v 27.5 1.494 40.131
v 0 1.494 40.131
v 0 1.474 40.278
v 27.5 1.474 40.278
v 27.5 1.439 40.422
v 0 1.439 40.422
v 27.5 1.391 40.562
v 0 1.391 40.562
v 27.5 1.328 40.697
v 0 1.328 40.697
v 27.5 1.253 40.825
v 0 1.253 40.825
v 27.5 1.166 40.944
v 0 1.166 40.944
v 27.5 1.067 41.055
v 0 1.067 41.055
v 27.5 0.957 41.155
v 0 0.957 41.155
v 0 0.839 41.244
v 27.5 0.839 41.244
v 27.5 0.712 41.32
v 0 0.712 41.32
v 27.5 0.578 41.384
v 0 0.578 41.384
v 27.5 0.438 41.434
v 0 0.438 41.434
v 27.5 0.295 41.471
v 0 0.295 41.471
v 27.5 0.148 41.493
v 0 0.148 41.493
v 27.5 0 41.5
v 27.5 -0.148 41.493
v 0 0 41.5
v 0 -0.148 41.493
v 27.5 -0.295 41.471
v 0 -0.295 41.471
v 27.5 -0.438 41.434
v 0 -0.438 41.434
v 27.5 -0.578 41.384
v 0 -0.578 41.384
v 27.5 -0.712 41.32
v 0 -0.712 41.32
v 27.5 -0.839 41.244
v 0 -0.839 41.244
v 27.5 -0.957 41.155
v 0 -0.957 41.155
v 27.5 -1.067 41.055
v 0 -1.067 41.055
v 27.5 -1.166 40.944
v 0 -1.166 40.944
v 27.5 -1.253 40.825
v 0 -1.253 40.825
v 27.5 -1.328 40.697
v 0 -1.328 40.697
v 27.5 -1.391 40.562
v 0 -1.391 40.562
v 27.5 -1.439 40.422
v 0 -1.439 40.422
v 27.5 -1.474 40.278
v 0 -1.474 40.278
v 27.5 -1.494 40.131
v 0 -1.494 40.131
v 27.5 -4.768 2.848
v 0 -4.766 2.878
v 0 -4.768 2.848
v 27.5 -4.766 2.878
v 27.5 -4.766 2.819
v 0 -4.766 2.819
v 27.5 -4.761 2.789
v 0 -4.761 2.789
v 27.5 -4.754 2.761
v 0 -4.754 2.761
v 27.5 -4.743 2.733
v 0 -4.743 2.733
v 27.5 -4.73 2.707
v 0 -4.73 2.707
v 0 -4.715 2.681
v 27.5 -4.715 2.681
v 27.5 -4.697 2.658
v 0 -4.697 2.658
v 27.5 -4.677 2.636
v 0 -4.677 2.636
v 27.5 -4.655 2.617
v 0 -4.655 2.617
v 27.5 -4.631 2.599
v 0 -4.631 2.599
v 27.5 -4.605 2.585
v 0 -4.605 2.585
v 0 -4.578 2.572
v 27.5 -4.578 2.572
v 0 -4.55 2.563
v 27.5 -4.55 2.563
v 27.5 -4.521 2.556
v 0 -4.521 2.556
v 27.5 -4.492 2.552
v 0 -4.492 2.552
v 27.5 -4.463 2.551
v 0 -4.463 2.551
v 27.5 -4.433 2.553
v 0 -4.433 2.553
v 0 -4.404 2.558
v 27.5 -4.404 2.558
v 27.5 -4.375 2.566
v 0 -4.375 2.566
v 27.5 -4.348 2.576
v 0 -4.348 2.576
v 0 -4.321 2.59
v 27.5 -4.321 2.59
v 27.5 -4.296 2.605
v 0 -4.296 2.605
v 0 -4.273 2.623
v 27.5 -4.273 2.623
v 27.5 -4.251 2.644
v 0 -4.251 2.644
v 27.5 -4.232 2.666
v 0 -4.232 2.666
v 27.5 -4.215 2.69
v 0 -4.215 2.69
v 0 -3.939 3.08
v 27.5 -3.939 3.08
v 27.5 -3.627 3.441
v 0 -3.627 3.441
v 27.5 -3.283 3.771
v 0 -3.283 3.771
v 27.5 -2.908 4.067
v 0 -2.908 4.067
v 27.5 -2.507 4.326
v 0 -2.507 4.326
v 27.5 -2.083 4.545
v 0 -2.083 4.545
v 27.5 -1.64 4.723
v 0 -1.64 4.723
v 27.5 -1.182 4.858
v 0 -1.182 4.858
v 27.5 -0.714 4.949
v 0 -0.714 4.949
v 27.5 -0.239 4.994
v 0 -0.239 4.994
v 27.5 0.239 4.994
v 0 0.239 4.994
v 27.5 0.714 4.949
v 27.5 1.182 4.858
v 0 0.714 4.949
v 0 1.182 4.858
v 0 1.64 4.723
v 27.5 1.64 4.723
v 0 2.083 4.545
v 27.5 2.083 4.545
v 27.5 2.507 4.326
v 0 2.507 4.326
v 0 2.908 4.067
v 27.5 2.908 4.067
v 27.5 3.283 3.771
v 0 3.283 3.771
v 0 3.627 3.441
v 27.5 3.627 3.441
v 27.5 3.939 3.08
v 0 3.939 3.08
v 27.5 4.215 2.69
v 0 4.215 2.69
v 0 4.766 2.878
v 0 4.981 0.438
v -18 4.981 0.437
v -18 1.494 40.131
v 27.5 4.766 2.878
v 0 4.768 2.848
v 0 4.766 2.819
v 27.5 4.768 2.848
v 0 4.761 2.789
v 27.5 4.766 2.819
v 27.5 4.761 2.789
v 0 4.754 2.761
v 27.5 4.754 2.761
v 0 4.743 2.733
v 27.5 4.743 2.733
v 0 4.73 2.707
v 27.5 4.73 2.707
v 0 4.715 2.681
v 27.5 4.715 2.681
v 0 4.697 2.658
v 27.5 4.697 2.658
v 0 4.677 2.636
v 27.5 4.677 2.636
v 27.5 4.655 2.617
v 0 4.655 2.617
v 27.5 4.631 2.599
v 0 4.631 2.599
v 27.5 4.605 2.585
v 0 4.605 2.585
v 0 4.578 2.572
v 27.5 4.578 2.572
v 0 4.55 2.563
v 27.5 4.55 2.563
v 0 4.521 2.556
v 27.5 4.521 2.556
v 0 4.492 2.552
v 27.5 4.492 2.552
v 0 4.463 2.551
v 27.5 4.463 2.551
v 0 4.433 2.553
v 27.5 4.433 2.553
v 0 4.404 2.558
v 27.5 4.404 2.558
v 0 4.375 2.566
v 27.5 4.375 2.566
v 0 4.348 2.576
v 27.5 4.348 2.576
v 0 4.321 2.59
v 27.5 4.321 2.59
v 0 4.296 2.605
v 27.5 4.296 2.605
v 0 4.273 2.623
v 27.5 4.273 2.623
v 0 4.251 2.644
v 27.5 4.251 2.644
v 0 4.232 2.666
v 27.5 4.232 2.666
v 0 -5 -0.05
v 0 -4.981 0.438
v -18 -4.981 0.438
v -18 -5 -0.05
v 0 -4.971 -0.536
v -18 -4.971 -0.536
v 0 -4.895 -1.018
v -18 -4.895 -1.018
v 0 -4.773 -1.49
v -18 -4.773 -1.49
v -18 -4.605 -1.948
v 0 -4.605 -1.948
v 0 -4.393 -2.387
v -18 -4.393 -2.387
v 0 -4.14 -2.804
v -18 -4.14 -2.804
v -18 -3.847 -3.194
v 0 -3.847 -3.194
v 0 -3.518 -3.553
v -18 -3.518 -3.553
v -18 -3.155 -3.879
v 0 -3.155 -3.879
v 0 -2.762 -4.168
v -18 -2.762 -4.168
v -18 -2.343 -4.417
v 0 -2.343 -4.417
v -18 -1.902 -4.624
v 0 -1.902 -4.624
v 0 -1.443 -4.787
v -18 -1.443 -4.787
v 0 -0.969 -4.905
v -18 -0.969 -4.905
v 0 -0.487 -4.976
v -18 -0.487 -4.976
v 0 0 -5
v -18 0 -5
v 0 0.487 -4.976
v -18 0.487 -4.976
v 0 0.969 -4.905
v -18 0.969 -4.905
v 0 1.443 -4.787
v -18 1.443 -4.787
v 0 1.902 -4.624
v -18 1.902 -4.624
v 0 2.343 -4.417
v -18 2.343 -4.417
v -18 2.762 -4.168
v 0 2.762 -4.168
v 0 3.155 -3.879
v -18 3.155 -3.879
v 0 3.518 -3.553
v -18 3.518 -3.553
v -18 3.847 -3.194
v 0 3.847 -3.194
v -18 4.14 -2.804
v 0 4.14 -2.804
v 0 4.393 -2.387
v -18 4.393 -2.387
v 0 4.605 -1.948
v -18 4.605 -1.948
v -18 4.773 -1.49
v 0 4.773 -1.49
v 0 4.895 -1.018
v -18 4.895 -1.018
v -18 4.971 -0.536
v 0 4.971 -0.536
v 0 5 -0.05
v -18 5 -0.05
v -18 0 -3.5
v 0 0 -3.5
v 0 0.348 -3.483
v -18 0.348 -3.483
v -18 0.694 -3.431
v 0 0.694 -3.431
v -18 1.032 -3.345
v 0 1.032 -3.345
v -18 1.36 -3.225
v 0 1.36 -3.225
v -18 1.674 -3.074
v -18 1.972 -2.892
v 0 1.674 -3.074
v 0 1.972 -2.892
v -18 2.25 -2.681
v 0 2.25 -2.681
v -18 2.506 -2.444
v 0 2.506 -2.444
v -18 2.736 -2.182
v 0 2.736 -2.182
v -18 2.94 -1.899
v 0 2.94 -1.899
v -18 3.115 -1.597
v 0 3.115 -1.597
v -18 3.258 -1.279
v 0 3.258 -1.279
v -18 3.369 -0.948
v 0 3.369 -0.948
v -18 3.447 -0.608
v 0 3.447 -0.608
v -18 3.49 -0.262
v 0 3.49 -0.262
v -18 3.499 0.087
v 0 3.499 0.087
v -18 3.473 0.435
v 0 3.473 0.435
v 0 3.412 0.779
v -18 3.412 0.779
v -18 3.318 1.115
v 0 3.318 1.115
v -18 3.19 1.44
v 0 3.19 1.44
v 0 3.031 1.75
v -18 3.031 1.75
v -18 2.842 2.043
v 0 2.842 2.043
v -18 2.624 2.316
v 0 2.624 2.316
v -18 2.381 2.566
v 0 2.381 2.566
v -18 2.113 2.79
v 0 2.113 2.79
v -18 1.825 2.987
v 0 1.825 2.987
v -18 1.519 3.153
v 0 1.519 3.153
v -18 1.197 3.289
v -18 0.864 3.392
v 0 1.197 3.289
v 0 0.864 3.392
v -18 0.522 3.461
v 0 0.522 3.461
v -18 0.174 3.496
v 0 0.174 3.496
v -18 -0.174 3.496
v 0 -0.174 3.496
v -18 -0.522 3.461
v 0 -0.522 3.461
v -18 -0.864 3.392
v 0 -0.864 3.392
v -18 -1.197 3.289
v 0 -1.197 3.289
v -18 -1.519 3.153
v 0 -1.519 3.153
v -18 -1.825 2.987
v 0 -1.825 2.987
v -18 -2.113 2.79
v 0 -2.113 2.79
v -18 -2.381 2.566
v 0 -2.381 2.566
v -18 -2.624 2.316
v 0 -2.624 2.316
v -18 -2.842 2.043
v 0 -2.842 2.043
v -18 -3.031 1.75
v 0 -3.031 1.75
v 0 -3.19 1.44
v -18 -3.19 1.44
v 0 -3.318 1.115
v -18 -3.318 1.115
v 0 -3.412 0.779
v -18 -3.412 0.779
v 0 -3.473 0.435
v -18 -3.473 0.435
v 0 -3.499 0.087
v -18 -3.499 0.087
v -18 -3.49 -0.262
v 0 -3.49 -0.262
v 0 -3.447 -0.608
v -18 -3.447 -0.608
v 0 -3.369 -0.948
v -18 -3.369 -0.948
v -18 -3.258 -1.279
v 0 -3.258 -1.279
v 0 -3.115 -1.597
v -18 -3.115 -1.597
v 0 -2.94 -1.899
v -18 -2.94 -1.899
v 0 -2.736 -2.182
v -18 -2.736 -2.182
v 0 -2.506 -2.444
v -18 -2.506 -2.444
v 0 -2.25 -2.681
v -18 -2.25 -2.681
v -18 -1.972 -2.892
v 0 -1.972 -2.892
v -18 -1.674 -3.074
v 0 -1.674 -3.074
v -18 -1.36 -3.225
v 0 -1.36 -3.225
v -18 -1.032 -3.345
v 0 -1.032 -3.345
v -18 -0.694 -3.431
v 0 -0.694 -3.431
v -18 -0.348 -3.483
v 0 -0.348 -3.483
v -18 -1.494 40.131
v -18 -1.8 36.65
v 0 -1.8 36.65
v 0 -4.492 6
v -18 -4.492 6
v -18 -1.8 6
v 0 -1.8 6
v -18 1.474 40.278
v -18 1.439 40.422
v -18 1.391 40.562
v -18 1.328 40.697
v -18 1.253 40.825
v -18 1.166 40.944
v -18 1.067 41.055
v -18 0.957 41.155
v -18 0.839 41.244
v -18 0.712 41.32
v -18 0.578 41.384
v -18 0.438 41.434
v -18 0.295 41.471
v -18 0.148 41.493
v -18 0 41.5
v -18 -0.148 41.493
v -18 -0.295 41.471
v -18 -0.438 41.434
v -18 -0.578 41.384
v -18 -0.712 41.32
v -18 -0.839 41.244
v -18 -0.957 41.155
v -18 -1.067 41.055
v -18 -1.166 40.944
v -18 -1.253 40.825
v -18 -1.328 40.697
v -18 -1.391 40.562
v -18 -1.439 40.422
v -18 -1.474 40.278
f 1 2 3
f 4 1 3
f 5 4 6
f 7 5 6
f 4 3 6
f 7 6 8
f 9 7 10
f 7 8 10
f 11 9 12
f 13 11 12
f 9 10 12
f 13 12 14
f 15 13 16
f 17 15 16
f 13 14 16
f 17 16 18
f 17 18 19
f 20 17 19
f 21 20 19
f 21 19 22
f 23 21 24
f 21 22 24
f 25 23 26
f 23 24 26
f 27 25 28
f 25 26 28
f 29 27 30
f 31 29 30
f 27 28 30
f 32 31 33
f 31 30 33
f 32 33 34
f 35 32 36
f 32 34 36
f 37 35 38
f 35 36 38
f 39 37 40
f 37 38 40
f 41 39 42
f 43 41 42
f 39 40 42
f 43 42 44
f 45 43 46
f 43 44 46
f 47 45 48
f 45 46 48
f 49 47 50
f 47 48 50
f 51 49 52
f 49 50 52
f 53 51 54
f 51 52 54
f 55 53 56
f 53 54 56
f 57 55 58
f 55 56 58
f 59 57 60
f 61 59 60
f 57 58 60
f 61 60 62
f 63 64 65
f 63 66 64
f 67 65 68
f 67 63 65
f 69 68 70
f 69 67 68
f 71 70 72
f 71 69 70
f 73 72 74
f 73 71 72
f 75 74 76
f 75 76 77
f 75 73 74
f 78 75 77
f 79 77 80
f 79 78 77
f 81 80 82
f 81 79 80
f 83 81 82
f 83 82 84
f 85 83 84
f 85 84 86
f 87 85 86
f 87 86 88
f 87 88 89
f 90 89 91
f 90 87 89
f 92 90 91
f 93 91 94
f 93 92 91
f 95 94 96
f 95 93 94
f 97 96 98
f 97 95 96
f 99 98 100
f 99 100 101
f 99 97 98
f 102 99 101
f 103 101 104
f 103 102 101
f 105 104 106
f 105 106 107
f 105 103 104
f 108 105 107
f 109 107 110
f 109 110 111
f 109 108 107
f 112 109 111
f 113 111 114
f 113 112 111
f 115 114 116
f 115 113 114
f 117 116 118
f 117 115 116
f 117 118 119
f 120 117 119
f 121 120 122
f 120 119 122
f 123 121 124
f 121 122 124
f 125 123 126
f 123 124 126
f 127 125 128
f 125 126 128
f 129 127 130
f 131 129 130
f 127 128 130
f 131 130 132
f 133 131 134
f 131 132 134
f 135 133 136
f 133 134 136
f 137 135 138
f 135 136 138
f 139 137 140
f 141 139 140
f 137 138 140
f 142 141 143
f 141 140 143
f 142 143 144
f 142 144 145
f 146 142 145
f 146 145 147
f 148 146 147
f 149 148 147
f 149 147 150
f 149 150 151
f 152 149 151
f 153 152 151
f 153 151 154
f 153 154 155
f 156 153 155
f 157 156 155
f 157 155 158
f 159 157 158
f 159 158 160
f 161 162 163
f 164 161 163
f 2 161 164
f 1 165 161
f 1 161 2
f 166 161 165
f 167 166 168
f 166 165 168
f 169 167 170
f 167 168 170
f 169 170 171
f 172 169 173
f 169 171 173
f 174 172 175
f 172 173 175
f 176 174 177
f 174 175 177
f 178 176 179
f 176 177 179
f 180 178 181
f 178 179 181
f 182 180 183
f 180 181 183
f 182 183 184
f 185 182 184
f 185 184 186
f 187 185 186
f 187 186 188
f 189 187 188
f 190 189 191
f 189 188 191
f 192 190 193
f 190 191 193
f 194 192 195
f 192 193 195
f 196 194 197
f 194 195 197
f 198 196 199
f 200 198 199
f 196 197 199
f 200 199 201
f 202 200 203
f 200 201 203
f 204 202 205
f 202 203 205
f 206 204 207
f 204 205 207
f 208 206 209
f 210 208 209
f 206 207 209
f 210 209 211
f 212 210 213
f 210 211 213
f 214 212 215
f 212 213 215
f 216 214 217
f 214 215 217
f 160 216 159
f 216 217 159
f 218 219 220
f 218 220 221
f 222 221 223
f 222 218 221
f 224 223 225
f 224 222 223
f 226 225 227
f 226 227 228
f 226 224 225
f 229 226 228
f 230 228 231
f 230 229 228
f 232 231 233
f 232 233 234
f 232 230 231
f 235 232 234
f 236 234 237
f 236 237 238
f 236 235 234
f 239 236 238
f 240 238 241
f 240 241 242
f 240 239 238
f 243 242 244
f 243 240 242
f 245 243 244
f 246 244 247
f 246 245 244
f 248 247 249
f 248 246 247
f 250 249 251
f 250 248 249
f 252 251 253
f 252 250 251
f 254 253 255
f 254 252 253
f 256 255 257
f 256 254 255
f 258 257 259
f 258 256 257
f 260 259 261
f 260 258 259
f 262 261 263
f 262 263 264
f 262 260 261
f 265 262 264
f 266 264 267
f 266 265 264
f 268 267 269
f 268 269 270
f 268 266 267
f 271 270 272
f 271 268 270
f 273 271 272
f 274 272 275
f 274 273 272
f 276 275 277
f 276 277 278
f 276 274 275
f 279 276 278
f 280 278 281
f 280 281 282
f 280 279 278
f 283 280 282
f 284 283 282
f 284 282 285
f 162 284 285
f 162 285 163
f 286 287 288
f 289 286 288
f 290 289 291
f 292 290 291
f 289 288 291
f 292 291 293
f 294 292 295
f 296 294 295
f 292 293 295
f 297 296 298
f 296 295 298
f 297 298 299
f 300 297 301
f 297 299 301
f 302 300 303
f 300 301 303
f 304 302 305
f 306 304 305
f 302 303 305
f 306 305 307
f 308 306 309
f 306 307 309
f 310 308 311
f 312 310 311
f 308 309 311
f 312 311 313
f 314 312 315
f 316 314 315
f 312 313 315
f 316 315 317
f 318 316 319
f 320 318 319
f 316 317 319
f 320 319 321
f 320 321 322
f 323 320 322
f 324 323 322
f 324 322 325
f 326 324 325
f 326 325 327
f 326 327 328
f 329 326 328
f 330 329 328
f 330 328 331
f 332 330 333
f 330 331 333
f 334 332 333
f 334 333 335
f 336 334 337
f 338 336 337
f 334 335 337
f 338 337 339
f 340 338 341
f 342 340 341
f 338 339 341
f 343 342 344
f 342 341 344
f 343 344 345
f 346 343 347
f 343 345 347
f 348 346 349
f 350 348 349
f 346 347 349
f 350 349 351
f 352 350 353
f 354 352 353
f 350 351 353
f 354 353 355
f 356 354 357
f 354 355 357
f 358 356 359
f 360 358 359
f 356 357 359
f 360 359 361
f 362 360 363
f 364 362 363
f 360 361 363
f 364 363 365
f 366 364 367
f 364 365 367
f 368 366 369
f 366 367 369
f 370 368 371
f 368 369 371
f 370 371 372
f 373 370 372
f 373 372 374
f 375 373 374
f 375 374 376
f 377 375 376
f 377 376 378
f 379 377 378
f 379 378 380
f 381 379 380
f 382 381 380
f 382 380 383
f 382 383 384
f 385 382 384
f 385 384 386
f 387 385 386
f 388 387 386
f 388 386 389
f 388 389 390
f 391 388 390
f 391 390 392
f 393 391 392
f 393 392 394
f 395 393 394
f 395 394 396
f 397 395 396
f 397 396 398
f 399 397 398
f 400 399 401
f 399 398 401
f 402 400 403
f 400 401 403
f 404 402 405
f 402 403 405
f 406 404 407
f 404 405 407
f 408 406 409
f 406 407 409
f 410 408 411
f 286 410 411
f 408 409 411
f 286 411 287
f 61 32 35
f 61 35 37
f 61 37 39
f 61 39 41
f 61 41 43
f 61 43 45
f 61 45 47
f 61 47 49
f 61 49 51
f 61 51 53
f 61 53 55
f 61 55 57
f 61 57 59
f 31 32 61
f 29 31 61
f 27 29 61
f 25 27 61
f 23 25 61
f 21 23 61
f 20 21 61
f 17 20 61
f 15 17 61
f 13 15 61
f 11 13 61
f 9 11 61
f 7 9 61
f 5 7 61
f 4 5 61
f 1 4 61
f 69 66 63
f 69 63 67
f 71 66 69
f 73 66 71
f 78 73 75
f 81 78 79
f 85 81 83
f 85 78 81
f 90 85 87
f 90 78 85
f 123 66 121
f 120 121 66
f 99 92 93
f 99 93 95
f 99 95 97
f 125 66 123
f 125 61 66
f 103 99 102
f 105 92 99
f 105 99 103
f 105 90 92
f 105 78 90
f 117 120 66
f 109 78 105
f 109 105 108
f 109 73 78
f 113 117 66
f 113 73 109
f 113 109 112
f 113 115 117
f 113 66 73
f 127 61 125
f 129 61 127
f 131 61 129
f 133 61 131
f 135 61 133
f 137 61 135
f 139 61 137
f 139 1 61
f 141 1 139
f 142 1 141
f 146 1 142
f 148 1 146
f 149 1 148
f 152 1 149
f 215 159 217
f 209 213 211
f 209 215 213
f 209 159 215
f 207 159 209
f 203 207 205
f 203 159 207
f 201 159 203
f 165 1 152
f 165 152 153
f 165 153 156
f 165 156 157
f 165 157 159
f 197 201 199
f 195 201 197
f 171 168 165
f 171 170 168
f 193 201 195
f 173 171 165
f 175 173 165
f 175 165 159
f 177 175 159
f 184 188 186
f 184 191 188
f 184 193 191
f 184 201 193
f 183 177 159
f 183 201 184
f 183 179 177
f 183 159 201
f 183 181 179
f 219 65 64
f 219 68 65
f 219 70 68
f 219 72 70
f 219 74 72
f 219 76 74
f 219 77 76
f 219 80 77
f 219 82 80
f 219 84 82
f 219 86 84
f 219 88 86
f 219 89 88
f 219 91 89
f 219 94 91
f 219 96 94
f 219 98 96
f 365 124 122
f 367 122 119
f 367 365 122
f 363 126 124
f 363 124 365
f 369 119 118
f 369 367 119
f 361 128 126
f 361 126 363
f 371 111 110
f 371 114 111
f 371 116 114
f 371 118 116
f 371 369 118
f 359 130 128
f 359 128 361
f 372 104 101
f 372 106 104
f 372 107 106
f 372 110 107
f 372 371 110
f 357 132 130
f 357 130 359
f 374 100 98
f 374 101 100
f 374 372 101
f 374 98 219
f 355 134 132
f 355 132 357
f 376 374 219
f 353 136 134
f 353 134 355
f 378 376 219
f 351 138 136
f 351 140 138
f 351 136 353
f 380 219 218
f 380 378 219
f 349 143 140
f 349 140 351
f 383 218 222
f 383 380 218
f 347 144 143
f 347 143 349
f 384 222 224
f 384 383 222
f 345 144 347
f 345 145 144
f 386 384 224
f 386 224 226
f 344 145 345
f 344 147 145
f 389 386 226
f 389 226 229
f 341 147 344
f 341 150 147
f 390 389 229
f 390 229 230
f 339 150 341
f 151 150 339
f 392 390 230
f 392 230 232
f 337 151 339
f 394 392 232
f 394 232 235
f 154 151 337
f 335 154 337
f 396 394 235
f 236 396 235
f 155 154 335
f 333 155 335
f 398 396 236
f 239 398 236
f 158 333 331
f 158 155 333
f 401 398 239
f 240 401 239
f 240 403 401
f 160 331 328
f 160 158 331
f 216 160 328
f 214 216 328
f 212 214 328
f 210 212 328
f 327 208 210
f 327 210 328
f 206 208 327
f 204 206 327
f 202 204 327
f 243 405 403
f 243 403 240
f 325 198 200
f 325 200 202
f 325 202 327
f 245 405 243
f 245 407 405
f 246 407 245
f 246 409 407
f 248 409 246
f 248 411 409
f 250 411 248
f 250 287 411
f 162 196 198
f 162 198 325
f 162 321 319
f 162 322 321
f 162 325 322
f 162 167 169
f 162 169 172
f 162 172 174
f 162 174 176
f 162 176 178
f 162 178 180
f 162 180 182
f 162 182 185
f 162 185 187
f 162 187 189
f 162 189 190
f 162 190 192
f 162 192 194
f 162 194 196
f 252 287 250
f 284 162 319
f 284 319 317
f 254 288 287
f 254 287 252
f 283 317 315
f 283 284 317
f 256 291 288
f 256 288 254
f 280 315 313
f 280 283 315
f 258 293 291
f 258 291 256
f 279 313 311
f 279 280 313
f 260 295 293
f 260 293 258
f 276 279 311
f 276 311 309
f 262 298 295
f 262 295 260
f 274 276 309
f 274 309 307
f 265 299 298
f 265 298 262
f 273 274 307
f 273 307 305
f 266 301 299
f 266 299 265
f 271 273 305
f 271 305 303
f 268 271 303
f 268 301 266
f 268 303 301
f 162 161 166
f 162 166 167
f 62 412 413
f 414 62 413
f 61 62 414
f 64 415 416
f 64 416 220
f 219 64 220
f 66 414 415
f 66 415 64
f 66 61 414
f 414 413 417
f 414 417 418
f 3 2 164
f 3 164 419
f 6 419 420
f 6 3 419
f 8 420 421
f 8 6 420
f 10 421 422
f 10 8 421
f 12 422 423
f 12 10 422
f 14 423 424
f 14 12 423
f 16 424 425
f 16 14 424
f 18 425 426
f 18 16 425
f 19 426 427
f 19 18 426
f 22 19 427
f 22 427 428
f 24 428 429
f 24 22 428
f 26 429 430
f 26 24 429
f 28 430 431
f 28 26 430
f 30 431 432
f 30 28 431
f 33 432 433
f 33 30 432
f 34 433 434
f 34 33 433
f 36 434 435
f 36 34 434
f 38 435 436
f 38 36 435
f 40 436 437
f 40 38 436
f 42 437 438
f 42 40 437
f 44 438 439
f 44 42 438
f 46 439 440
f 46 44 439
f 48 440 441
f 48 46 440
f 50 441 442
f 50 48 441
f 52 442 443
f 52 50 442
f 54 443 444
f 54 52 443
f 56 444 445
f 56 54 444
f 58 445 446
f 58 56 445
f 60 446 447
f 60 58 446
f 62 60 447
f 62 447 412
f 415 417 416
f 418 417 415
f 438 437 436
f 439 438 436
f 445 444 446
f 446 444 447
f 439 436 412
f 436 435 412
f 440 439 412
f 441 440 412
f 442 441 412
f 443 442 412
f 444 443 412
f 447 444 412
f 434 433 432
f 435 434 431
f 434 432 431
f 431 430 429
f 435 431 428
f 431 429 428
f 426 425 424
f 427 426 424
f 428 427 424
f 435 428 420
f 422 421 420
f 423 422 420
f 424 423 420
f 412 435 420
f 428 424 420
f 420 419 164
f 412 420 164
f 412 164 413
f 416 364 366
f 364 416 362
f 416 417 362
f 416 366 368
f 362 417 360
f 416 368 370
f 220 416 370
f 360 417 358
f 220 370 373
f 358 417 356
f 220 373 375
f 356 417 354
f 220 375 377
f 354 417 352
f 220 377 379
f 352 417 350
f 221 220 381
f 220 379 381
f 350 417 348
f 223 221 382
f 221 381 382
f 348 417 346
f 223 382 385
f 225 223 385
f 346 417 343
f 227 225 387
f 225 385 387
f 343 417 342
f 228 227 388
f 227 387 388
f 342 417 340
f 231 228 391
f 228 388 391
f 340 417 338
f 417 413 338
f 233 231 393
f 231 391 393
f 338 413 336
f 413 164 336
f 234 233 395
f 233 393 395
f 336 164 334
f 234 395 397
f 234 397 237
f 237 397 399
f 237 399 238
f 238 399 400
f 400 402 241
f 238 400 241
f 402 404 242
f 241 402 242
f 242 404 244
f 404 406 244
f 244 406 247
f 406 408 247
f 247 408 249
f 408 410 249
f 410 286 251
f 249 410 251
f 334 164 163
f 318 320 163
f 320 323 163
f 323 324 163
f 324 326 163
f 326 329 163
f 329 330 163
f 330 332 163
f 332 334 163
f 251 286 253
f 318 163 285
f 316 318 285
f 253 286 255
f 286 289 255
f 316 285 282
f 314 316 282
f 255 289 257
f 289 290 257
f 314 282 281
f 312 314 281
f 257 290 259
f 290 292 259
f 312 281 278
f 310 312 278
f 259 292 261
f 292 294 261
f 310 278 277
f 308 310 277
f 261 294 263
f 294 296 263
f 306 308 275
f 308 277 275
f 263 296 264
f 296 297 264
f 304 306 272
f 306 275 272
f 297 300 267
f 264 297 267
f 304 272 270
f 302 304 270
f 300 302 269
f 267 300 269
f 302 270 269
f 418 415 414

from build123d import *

# Parameters (mm, degrees)
BOSS_EXTRUDE1_DEPTH = 27.5
BOSS_EXTRUDE2_START = -18
SKETCH1_3_R         = 3.5
BOSS_EXTRUDE2_DEPTH = 18
FILLET1_R           = 0.3
CUT_EXTRUDE1_START  = 6
SKETCH2_W           = 18
SKETCH2_H           = 4.33028374
CUT_EXTRUDE1_DEPTH  = 48


with BuildPart() as part:
    # Sketch1 → Boss-Extrude1 (new body)
    with BuildSketch(Plane(origin=(0, 0, 0), x_dir=(0, 0, -1), z_dir=(1, 0, 0))):
        with BuildLine():
            Line((-0.4375, 4.980822598), (-40.13125, 1.494246779))
            ThreePointArc((-40.13125, 1.494246779), (-41.5, 0), (-40.13125, -1.494246779))
            Line((-40.13125, -1.494246779), (-0.4375, -4.980822598))
            ThreePointArc((-0.4375, -4.980822598), (-5, 0), (-0.4375, 4.980822598))
        make_face()
    extrude(amount=BOSS_EXTRUDE1_DEPTH)

    # Sketch1<3> → Boss-Extrude2 (add)
    with BuildSketch(Plane(origin=(0, 0, 0), x_dir=(0, 0, -1), z_dir=(1, 0, 0)).offset(BOSS_EXTRUDE2_START)):
        with BuildLine():
            Line((-0.4375, 4.980822598), (-40.13125, 1.494246779))
            ThreePointArc((-40.13125, 1.494246779), (-41.5, 0), (-40.13125, -1.494246779))
            Line((-40.13125, -1.494246779), (-0.4375, -4.980822598))
            ThreePointArc((-0.4375, -4.980822598), (5, 0), (-0.4375, 4.980822598))
        make_face()
        Circle(SKETCH1_3_R, mode=Mode.SUBTRACT)
    extrude(amount=BOSS_EXTRUDE2_DEPTH)

    # Fillet1
    fillet1_edges = [part.edges().sort_by_distance(p)[0] for p in [
        (13.75, -4.980822598, 0.4375),
        (13.75, 4.980822598, 0.4375),
    ]]
    fillet(fillet1_edges, radius=FILLET1_R)

    # Sketch2 → Cut-Extrude1 (cut)
    with BuildSketch(Plane.XY.offset(CUT_EXTRUDE1_START)):
        with Locations((-9, -3.96514187)):
            Rectangle(SKETCH2_W, SKETCH2_H)
    extrude(amount=CUT_EXTRUDE1_DEPTH, mode=Mode.SUBTRACT)


solid = part.part
